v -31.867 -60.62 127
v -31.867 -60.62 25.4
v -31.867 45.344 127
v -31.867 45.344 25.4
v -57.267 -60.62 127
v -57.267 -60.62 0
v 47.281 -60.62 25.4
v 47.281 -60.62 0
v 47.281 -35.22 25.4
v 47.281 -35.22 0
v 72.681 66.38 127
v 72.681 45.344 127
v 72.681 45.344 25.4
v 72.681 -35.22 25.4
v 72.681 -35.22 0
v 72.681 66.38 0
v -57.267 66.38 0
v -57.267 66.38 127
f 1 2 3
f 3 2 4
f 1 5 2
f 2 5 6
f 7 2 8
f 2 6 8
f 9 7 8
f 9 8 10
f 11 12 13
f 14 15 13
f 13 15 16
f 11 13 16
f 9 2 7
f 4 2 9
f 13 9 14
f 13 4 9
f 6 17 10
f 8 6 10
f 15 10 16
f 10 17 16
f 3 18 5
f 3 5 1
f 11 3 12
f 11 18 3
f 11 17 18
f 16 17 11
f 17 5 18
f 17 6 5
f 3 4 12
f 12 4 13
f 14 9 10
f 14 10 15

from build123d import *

# Parameters (mm, degrees)
F0_W     = 129.9482808348
F0_H     = 127
F1_DEPTH = 25.4
F2_W     = 25.4
F2_H     = 127
F3_DEPTH = 25.4
F4_DEPTH = 76.2
F5_W     = 104.5482808348
F5_H     = 21.0354196131
F6_DEPTH = 101.6
F7_W     = 25.4
F7_H     = 25.4
F8_DEPTH = 25.4


with BuildPart() as f1:
    # F0 (on Top) → F1 (new body)
    with BuildSketch(Plane.XY):
        with Locations((7.7071934938, 2.8795562685)):
            Rectangle(F0_W, F0_H)
    extrude(amount=F1_DEPTH)

    # F2 (on face) → F3 (join)
    with BuildSketch(Plane.XY.offset(25.4)):
        with Locations((-44.5669469236, 2.8795562685)):
            Rectangle(F2_W, F2_H)
    extrude(amount=F3_DEPTH)

    # F4 (add): a face of the model
    f4_faces = [f1.faces().sort_by_distance(p)[0] for p in [
        (-44.5669469236, 2.8795562685, 50.8),
    ]]
    extrude(f4_faces, amount=F4_DEPTH)

    # F5 (on face) → F6 (join)
    with BuildSketch(Plane.XY.offset(25.4)):
        with Locations((20.4071934938, 55.8618464619)):
            Rectangle(F5_W, F5_H)
    extrude(amount=F6_DEPTH)

    # F7 (on face) → F8 (cut)
    with BuildSketch(Plane.XY.offset(25.4)):
        with Locations((59.9813339112, -47.9204437315)):
            Rectangle(F7_W, F7_H)
    extrude(amount=-F8_DEPTH, mode=Mode.SUBTRACT)


solid = f1.part
